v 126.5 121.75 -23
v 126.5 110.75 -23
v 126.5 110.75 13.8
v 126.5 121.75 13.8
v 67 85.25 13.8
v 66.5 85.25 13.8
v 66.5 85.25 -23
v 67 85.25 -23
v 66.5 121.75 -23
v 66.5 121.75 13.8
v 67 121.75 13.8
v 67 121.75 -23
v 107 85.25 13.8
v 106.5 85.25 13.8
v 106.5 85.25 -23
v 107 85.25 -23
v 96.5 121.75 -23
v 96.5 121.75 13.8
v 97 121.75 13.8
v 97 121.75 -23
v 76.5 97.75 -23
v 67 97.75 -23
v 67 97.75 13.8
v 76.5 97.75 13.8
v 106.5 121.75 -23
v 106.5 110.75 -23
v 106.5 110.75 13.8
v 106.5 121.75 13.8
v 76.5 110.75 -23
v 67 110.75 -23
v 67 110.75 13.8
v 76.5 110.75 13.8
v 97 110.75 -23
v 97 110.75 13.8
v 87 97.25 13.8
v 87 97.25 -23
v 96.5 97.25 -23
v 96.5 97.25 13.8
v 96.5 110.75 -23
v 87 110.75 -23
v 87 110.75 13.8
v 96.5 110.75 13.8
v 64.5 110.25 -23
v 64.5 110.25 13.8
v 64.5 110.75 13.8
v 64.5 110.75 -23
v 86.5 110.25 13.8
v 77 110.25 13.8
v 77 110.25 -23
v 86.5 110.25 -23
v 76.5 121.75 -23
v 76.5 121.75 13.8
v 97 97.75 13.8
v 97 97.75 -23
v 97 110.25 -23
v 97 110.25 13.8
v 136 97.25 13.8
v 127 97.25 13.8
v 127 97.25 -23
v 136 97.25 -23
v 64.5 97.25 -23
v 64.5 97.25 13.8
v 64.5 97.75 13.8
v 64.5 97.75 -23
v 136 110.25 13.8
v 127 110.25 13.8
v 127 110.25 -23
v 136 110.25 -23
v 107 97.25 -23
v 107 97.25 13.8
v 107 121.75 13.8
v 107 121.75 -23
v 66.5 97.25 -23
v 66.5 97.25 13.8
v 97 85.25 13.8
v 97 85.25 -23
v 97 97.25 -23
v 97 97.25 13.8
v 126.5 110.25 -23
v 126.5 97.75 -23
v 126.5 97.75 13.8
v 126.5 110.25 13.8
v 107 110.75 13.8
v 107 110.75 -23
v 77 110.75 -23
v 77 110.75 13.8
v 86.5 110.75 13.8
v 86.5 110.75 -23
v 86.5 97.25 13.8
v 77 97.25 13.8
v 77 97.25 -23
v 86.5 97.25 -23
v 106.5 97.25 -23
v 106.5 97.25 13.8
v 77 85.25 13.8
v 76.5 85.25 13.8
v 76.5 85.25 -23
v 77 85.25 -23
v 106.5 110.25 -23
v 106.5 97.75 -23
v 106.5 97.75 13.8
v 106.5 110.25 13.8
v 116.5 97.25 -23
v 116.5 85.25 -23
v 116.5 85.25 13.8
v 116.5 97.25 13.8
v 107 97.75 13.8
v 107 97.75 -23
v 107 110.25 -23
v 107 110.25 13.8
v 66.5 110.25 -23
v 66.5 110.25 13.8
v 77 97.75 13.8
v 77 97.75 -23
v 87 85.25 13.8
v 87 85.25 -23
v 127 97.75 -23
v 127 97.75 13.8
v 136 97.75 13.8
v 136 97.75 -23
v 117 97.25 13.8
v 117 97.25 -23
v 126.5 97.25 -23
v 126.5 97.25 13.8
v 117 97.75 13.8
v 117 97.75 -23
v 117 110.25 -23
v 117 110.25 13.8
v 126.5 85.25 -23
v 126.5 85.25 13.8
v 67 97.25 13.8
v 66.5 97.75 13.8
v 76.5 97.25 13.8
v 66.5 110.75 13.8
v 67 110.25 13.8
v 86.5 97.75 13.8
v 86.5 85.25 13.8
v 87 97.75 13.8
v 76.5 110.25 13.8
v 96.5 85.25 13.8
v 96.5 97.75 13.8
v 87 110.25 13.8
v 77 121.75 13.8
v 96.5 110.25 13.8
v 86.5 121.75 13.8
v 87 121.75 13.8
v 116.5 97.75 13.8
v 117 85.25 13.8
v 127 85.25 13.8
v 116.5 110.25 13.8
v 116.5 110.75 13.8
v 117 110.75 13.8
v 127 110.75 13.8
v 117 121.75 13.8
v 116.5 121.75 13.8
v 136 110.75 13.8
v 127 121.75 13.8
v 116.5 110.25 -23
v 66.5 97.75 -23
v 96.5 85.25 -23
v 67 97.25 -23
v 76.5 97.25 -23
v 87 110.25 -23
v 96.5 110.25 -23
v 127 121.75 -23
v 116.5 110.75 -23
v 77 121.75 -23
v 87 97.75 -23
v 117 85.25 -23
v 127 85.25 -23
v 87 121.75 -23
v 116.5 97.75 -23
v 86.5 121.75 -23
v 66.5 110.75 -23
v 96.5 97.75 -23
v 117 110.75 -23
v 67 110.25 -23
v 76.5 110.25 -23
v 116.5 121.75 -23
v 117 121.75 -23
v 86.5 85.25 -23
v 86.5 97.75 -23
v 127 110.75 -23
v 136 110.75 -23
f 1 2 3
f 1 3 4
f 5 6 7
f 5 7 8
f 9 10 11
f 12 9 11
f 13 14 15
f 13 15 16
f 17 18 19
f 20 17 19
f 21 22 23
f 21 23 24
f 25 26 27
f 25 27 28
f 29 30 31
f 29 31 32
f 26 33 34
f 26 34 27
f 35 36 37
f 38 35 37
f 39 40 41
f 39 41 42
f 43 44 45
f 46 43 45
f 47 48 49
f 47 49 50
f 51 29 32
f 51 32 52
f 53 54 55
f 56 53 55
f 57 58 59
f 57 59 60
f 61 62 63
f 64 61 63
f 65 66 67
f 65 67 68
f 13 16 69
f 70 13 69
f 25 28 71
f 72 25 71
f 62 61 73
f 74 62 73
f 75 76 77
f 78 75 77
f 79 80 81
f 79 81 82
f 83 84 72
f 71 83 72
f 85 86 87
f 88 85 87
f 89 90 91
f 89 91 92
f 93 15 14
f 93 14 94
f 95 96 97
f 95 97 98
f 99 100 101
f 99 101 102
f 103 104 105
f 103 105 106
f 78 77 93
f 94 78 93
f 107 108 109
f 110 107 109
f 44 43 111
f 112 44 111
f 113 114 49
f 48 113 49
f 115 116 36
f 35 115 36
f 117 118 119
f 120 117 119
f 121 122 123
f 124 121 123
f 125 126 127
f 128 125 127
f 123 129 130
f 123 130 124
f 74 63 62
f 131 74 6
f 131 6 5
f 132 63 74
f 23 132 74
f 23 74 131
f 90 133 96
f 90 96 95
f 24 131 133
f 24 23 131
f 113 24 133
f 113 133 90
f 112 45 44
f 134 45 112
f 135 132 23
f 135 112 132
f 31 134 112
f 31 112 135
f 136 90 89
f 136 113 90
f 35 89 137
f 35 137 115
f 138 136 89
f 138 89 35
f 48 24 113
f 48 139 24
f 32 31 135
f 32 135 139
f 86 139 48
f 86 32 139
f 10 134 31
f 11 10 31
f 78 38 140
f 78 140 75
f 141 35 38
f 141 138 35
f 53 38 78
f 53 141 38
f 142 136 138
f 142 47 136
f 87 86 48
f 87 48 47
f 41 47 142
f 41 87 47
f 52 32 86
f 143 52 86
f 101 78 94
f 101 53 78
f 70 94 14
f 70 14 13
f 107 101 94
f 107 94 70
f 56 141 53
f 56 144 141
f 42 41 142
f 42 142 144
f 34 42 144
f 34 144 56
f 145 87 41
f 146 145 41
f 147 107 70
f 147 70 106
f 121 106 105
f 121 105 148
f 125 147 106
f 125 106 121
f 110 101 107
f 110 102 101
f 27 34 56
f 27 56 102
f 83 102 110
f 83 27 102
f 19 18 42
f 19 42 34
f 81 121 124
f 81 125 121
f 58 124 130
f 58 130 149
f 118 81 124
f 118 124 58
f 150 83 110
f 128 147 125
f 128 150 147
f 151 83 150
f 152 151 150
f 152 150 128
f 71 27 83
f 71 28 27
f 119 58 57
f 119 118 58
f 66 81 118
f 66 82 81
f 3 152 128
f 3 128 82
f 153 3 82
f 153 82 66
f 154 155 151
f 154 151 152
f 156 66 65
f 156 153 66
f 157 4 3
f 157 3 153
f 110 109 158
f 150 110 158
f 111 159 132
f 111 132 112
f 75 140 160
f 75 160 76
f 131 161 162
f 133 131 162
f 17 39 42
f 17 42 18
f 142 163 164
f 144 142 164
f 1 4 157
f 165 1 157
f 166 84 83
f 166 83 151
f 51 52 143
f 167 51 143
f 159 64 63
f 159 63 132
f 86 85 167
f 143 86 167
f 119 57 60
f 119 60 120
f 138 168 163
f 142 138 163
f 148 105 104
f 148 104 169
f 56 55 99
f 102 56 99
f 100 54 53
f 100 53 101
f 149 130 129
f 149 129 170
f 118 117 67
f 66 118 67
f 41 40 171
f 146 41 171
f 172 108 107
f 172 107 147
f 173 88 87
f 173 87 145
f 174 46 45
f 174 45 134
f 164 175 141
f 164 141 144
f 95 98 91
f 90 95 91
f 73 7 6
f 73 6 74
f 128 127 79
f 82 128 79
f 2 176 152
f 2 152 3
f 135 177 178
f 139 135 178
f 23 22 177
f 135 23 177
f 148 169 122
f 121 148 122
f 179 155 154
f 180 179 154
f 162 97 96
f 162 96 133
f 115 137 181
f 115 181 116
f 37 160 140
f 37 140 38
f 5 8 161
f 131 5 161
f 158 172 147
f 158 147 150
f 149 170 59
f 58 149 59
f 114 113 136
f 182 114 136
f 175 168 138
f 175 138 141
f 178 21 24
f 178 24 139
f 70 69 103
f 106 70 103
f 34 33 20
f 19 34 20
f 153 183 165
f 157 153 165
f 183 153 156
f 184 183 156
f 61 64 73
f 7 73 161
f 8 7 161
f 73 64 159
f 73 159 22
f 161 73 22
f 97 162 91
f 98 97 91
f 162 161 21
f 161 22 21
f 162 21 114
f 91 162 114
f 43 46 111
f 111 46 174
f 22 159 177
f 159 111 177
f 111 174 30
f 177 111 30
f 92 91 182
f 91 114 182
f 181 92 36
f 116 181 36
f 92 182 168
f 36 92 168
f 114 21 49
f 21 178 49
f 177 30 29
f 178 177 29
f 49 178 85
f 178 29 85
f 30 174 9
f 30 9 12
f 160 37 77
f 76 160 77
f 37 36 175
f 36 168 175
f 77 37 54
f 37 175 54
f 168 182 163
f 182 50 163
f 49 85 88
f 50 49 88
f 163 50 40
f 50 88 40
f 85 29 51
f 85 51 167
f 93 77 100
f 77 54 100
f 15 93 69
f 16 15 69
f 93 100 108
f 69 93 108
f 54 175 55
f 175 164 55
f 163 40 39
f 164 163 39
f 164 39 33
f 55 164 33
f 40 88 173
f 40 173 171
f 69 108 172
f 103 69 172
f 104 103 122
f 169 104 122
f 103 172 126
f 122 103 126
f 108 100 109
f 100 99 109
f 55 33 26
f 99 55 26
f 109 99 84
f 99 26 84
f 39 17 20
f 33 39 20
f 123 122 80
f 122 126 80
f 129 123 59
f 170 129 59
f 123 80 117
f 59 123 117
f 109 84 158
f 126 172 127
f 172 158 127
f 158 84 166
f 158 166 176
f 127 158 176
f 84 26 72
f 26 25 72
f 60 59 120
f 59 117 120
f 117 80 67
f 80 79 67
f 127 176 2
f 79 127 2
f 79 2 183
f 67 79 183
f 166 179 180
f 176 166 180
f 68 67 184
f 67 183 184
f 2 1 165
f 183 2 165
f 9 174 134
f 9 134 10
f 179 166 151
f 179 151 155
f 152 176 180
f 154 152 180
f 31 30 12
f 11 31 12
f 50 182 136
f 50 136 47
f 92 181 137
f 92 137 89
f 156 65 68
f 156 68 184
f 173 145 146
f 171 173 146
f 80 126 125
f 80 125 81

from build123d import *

# Parameters (mm, degrees)
BOX029_W     = 0.5
BOX029_H     = 36.5
BOX029_DEPTH = 36.8
BOX030_W     = 0.5
BOX030_H     = 36.5
BOX030_DEPTH = 36.8
BOX034_W     = 71.5
BOX034_H     = 0.5
BOX034_DEPTH = 36.8
BOX032_W     = 0.5
BOX032_H     = 36.5
BOX032_DEPTH = 36.8
BOX028_W     = 0.5
BOX028_H     = 36.5
BOX028_DEPTH = 36.8
BOX027_W     = 0.5
BOX027_H     = 36.5
BOX027_DEPTH = 36.8
BOX031_W     = 0.5
BOX031_H     = 36.5
BOX031_DEPTH = 36.8
BOX033_W     = 71.5
BOX033_H     = 0.5
BOX033_DEPTH = 36.8
BOX026_W     = 0.5
BOX026_H     = 36.5
BOX026_DEPTH = 36.8


with BuildPart() as box029:
    # Box029 → Box029 (new body)
    with BuildSketch(Plane(origin=(96.5, 85.25, -23), x_dir=(1, 0, 0), z_dir=(0, 0, 1))):
        with Locations((0.25, 18.25)):
            Rectangle(BOX029_W, BOX029_H)
    extrude(amount=BOX029_DEPTH)


with BuildPart() as box030:
    # Box030 → Box030 (new body)
    with BuildSketch(Plane(origin=(86.5, 85.25, -23), x_dir=(1, 0, 0), z_dir=(0, 0, 1))):
        with Locations((0.25, 18.25)):
            Rectangle(BOX030_W, BOX030_H)
    extrude(amount=BOX030_DEPTH)


with BuildPart() as box034:
    # Box034 → Box034 (new body)
    with BuildSketch(Plane(origin=(64.5, 110.25, -23), x_dir=(1, 0, 0), z_dir=(0, 0, 1))):
        with Locations((35.75, 0.25)):
            Rectangle(BOX034_W, BOX034_H)
    extrude(amount=BOX034_DEPTH)


with BuildPart() as box032:
    # Box032 → Box032 (new body)
    with BuildSketch(Plane(origin=(66.5, 85.25, -23), x_dir=(1, 0, 0), z_dir=(0, 0, 1))):
        with Locations((0.25, 18.25)):
            Rectangle(BOX032_W, BOX032_H)
    extrude(amount=BOX032_DEPTH)


with BuildPart() as box028:
    # Box028 → Box028 (new body)
    with BuildSketch(Plane(origin=(106.5, 85.25, -23), x_dir=(1, 0, 0), z_dir=(0, 0, 1))):
        with Locations((0.25, 18.25)):
            Rectangle(BOX028_W, BOX028_H)
    extrude(amount=BOX028_DEPTH)


with BuildPart() as box027:
    # Box027 → Box027 (new body)
    with BuildSketch(Plane(origin=(116.5, 85.25, -23), x_dir=(1, 0, 0), z_dir=(0, 0, 1))):
        with Locations((0.25, 18.25)):
            Rectangle(BOX027_W, BOX027_H)
    extrude(amount=BOX027_DEPTH)


with BuildPart() as box031:
    # Box031 → Box031 (new body)
    with BuildSketch(Plane(origin=(76.5, 85.25, -23), x_dir=(1, 0, 0), z_dir=(0, 0, 1))):
        with Locations((0.25, 18.25)):
            Rectangle(BOX031_W, BOX031_H)
    extrude(amount=BOX031_DEPTH)


with BuildPart() as box033:
    # Box033 → Box033 (new body)
    with BuildSketch(Plane(origin=(64.5, 97.25, -23), x_dir=(1, 0, 0), z_dir=(0, 0, 1))):
        with Locations((35.75, 0.25)):
            Rectangle(BOX033_W, BOX033_H)
    extrude(amount=BOX033_DEPTH)


with BuildPart() as support:
    # Box026 → Box026 (new body)
    with BuildSketch(Plane(origin=(126.5, 85.25, -23), x_dir=(1, 0, 0), z_dir=(0, 0, 1))):
        with Locations((0.25, 18.25)):
            Rectangle(BOX026_W, BOX026_H)
    extrude(amount=BOX026_DEPTH)

    # Fusion019: union Box029, Box030, Box034, Box032, Box028, Box027, Box031, Box033
    add(box029.part)
    add(box030.part)
    add(box034.part)
    add(box032.part)
    add(box028.part)
    add(box027.part)
    add(box031.part)
    add(box033.part)


solid = support.part
